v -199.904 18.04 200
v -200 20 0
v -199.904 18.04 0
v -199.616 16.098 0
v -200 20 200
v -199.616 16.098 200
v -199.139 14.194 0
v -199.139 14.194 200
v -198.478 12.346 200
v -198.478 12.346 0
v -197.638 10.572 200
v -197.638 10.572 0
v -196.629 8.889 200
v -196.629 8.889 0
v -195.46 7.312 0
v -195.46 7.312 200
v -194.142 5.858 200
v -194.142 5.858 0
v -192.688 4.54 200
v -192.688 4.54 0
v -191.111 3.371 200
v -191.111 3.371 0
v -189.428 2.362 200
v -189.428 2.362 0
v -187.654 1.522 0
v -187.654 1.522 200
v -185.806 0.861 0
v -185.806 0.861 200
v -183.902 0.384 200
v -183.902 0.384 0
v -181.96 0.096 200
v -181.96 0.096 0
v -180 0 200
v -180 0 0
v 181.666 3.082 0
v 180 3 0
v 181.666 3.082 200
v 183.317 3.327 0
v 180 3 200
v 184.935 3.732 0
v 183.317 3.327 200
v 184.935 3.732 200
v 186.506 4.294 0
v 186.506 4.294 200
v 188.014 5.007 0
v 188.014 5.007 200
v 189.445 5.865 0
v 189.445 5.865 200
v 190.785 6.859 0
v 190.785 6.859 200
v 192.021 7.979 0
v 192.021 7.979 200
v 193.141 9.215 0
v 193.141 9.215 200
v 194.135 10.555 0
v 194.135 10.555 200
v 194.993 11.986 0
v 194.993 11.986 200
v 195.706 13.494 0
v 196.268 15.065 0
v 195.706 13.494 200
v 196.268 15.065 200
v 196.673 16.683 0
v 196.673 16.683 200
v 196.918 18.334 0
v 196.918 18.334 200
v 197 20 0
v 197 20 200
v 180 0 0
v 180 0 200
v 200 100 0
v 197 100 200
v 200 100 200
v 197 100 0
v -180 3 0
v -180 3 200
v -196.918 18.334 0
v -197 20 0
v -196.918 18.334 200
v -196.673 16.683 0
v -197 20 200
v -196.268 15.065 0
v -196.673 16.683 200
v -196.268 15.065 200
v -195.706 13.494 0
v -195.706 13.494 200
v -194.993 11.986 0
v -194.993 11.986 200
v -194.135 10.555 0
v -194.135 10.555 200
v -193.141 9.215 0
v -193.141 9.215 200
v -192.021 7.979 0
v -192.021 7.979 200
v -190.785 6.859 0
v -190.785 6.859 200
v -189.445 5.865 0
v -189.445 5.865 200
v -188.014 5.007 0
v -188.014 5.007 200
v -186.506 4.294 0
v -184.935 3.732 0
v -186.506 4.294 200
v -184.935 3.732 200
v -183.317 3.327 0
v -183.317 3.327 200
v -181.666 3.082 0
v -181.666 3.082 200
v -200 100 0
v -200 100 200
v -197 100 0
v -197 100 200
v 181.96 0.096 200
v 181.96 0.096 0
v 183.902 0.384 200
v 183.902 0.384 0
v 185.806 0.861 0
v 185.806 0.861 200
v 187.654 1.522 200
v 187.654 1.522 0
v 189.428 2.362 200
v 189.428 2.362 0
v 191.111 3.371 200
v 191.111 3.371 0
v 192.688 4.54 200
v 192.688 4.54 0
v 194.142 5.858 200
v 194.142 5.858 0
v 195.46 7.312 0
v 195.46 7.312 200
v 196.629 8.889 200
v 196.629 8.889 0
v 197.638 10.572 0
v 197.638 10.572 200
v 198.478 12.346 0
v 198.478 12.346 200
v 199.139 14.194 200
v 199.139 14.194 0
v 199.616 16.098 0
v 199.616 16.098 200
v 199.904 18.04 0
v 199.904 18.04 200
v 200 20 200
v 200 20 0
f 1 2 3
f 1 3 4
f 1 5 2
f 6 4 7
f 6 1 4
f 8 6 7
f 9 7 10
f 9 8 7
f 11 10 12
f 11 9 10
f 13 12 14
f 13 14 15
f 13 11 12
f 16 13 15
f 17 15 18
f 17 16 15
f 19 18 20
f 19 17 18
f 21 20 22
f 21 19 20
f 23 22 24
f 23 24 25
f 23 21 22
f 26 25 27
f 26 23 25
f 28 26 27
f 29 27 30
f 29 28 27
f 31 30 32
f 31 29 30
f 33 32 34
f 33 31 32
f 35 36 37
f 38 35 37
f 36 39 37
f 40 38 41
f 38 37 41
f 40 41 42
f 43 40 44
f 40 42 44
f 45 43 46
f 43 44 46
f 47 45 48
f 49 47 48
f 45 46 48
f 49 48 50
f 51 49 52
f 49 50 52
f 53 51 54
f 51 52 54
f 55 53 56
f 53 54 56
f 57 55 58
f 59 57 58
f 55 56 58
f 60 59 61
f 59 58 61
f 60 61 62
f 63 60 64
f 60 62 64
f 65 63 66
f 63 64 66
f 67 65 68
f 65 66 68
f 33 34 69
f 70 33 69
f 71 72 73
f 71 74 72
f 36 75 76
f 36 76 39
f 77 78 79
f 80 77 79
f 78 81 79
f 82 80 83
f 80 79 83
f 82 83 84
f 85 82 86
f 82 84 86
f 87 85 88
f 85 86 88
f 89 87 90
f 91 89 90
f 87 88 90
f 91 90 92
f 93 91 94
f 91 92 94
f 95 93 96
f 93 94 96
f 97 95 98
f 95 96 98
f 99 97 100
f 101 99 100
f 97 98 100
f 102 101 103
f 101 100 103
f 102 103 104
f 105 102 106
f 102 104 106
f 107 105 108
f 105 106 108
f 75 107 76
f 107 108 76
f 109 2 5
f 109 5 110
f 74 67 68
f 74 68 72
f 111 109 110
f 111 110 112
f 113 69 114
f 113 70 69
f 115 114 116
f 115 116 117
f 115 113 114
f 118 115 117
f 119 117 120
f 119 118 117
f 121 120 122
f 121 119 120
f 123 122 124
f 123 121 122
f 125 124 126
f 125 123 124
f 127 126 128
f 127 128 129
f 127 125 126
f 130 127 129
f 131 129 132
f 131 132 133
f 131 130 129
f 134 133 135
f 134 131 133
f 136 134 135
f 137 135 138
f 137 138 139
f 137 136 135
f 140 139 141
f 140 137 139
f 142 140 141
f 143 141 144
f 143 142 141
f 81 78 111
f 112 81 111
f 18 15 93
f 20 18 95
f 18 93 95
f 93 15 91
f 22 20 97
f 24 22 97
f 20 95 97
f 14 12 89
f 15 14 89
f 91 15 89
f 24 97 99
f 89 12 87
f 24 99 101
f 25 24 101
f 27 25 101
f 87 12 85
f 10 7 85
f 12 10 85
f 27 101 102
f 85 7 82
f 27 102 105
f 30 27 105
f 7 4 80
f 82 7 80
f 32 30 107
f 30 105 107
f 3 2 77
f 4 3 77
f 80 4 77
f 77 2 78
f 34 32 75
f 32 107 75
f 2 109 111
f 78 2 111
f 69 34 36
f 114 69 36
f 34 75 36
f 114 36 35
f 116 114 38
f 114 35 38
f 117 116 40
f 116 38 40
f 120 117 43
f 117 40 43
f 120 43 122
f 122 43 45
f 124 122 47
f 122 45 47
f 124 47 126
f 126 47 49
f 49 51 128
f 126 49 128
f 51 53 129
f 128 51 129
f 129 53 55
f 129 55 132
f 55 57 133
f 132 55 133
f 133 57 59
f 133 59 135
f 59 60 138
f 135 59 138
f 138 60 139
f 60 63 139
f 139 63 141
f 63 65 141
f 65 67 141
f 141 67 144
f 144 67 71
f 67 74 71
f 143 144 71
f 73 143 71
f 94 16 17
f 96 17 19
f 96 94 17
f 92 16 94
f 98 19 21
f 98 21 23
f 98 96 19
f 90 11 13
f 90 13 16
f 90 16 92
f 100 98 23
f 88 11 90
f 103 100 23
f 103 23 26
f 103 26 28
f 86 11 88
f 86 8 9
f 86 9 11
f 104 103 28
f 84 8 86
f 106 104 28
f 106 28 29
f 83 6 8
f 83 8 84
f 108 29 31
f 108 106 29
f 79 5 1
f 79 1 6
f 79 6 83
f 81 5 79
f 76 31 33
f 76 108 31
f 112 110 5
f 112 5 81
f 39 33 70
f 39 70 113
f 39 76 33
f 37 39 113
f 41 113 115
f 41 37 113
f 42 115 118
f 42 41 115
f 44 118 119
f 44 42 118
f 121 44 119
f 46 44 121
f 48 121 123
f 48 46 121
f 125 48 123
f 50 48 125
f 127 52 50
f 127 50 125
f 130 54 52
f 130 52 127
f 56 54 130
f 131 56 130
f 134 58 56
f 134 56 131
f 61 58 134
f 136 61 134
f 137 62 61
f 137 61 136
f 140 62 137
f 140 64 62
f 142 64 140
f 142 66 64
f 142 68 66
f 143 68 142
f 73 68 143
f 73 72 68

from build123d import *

# Parameters (mm, degrees)
SKETCH_1_W      = 400
SKETCH_1_H      = 100
EXTRUDE_1_DEPTH = 200
FILLET_1_R      = 20
SHELL_1_T       = -3


with BuildPart() as part:
    # 草圖1 → 伸長1 (new body)
    with BuildSketch(Plane.XY):
        with Locations((0, 50)):
            Rectangle(SKETCH_1_W, SKETCH_1_H)
    extrude(amount=EXTRUDE_1_DEPTH)

    # 圓角1
    fillet_1_edges = [part.edges().sort_by_distance(p)[0] for p in [
        (200, 0, 100),
        (-200, 0, 100),
    ]]
    fillet(fillet_1_edges, radius=FILLET_1_R)

    # 薄殼1
    shell_1_openings = [part.faces().sort_by_distance(p)[0] for p in [
        (0, 50.196270167, 200),
        (0, 50.196270167, 0),
        (0, 100, 100),
    ]]
    offset(amount=SHELL_1_T, openings=shell_1_openings, kind=Kind.INTERSECTION)


solid = part.part
